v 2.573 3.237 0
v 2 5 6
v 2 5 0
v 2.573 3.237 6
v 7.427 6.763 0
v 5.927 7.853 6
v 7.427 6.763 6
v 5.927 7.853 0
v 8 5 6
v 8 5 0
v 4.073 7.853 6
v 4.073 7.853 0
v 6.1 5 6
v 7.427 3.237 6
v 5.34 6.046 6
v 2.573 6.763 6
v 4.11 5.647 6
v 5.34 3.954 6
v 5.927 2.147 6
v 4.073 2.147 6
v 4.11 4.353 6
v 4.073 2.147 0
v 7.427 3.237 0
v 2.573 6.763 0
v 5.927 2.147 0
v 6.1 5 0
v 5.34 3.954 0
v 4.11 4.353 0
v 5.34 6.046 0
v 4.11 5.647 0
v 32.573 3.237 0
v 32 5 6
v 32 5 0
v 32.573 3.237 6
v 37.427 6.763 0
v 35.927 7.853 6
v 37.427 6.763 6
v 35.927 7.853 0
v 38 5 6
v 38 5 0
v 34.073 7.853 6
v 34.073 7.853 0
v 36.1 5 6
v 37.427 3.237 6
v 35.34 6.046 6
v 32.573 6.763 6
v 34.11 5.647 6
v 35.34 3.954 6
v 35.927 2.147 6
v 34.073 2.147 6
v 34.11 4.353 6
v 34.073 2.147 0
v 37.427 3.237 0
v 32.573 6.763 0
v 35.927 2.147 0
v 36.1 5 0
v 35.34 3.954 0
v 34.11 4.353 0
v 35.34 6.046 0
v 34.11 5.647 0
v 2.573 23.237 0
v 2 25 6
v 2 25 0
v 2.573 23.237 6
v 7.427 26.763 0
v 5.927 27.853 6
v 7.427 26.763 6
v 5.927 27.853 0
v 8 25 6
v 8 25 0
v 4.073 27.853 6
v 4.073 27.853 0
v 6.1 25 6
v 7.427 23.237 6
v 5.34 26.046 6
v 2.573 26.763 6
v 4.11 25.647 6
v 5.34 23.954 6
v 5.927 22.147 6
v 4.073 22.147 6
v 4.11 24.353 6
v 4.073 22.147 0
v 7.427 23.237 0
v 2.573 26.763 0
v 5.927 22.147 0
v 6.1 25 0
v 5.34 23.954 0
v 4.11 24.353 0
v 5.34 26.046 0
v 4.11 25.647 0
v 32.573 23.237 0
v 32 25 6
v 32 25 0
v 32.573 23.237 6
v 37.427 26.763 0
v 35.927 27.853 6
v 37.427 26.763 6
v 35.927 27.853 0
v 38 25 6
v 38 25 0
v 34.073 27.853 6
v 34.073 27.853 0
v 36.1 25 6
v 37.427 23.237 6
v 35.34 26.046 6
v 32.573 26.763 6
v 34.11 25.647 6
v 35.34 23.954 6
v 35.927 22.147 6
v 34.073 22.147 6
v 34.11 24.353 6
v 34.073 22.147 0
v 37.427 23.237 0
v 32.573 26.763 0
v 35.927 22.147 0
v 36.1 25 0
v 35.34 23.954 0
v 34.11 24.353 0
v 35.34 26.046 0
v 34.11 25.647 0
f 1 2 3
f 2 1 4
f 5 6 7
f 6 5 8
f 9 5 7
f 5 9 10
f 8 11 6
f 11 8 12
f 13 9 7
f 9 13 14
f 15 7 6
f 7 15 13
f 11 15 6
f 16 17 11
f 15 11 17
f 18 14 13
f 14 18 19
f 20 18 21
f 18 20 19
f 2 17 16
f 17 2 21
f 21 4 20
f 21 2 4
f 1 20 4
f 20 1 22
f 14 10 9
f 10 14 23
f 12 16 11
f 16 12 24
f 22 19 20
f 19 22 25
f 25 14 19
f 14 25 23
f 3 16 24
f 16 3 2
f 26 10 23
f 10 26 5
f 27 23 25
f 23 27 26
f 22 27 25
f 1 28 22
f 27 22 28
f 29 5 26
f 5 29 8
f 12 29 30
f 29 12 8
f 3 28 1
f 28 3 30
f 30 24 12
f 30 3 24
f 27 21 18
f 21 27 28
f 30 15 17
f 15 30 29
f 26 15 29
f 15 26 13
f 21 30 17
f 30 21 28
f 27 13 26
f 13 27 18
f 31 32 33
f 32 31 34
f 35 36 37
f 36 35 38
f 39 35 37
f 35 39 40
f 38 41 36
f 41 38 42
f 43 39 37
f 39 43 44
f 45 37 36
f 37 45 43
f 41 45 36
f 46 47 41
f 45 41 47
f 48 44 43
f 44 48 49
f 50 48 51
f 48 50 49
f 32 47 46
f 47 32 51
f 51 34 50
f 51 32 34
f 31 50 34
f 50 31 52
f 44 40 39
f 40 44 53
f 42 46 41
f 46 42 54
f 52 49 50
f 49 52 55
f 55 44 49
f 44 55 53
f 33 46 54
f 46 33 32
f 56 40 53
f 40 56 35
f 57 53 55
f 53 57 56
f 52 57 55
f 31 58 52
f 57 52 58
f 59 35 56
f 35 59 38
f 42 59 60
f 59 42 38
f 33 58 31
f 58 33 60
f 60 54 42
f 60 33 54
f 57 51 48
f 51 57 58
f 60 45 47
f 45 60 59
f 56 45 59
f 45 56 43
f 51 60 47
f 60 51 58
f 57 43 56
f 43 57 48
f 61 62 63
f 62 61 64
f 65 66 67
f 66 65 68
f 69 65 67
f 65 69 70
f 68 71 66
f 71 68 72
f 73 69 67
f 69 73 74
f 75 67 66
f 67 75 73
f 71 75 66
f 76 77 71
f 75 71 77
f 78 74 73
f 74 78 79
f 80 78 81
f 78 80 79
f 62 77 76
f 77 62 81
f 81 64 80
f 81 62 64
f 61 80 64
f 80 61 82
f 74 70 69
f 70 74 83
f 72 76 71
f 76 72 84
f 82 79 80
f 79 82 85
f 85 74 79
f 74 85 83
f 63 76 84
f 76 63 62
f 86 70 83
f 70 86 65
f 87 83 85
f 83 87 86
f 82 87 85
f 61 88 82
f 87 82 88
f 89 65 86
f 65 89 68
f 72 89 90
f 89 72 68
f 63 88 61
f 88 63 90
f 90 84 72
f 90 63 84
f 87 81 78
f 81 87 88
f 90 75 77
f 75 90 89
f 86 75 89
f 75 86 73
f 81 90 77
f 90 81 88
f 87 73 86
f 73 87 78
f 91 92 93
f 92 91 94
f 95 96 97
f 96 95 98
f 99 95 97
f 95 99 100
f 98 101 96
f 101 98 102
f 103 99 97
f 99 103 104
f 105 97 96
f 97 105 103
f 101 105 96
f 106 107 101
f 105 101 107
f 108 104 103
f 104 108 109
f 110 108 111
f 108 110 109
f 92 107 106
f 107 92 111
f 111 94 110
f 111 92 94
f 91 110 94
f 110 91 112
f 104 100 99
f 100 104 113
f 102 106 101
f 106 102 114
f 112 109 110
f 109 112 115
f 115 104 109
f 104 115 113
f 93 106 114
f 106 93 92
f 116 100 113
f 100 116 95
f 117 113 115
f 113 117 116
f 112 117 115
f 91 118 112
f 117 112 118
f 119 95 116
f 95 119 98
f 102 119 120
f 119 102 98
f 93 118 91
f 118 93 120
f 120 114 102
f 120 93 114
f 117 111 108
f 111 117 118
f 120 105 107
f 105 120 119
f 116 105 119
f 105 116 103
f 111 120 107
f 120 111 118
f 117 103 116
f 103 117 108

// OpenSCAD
module standoff(h=6, d=6, hole=2.2) {
  difference() {
    cylinder(h=h, d=d);
    translate([0,0,-1]) cylinder(h=h+2, d=hole);
  } }
for (p = [[5,5], [35,5], [5,25], [35,25]])
  translate([p[0], p[1], 0]) standoff();
